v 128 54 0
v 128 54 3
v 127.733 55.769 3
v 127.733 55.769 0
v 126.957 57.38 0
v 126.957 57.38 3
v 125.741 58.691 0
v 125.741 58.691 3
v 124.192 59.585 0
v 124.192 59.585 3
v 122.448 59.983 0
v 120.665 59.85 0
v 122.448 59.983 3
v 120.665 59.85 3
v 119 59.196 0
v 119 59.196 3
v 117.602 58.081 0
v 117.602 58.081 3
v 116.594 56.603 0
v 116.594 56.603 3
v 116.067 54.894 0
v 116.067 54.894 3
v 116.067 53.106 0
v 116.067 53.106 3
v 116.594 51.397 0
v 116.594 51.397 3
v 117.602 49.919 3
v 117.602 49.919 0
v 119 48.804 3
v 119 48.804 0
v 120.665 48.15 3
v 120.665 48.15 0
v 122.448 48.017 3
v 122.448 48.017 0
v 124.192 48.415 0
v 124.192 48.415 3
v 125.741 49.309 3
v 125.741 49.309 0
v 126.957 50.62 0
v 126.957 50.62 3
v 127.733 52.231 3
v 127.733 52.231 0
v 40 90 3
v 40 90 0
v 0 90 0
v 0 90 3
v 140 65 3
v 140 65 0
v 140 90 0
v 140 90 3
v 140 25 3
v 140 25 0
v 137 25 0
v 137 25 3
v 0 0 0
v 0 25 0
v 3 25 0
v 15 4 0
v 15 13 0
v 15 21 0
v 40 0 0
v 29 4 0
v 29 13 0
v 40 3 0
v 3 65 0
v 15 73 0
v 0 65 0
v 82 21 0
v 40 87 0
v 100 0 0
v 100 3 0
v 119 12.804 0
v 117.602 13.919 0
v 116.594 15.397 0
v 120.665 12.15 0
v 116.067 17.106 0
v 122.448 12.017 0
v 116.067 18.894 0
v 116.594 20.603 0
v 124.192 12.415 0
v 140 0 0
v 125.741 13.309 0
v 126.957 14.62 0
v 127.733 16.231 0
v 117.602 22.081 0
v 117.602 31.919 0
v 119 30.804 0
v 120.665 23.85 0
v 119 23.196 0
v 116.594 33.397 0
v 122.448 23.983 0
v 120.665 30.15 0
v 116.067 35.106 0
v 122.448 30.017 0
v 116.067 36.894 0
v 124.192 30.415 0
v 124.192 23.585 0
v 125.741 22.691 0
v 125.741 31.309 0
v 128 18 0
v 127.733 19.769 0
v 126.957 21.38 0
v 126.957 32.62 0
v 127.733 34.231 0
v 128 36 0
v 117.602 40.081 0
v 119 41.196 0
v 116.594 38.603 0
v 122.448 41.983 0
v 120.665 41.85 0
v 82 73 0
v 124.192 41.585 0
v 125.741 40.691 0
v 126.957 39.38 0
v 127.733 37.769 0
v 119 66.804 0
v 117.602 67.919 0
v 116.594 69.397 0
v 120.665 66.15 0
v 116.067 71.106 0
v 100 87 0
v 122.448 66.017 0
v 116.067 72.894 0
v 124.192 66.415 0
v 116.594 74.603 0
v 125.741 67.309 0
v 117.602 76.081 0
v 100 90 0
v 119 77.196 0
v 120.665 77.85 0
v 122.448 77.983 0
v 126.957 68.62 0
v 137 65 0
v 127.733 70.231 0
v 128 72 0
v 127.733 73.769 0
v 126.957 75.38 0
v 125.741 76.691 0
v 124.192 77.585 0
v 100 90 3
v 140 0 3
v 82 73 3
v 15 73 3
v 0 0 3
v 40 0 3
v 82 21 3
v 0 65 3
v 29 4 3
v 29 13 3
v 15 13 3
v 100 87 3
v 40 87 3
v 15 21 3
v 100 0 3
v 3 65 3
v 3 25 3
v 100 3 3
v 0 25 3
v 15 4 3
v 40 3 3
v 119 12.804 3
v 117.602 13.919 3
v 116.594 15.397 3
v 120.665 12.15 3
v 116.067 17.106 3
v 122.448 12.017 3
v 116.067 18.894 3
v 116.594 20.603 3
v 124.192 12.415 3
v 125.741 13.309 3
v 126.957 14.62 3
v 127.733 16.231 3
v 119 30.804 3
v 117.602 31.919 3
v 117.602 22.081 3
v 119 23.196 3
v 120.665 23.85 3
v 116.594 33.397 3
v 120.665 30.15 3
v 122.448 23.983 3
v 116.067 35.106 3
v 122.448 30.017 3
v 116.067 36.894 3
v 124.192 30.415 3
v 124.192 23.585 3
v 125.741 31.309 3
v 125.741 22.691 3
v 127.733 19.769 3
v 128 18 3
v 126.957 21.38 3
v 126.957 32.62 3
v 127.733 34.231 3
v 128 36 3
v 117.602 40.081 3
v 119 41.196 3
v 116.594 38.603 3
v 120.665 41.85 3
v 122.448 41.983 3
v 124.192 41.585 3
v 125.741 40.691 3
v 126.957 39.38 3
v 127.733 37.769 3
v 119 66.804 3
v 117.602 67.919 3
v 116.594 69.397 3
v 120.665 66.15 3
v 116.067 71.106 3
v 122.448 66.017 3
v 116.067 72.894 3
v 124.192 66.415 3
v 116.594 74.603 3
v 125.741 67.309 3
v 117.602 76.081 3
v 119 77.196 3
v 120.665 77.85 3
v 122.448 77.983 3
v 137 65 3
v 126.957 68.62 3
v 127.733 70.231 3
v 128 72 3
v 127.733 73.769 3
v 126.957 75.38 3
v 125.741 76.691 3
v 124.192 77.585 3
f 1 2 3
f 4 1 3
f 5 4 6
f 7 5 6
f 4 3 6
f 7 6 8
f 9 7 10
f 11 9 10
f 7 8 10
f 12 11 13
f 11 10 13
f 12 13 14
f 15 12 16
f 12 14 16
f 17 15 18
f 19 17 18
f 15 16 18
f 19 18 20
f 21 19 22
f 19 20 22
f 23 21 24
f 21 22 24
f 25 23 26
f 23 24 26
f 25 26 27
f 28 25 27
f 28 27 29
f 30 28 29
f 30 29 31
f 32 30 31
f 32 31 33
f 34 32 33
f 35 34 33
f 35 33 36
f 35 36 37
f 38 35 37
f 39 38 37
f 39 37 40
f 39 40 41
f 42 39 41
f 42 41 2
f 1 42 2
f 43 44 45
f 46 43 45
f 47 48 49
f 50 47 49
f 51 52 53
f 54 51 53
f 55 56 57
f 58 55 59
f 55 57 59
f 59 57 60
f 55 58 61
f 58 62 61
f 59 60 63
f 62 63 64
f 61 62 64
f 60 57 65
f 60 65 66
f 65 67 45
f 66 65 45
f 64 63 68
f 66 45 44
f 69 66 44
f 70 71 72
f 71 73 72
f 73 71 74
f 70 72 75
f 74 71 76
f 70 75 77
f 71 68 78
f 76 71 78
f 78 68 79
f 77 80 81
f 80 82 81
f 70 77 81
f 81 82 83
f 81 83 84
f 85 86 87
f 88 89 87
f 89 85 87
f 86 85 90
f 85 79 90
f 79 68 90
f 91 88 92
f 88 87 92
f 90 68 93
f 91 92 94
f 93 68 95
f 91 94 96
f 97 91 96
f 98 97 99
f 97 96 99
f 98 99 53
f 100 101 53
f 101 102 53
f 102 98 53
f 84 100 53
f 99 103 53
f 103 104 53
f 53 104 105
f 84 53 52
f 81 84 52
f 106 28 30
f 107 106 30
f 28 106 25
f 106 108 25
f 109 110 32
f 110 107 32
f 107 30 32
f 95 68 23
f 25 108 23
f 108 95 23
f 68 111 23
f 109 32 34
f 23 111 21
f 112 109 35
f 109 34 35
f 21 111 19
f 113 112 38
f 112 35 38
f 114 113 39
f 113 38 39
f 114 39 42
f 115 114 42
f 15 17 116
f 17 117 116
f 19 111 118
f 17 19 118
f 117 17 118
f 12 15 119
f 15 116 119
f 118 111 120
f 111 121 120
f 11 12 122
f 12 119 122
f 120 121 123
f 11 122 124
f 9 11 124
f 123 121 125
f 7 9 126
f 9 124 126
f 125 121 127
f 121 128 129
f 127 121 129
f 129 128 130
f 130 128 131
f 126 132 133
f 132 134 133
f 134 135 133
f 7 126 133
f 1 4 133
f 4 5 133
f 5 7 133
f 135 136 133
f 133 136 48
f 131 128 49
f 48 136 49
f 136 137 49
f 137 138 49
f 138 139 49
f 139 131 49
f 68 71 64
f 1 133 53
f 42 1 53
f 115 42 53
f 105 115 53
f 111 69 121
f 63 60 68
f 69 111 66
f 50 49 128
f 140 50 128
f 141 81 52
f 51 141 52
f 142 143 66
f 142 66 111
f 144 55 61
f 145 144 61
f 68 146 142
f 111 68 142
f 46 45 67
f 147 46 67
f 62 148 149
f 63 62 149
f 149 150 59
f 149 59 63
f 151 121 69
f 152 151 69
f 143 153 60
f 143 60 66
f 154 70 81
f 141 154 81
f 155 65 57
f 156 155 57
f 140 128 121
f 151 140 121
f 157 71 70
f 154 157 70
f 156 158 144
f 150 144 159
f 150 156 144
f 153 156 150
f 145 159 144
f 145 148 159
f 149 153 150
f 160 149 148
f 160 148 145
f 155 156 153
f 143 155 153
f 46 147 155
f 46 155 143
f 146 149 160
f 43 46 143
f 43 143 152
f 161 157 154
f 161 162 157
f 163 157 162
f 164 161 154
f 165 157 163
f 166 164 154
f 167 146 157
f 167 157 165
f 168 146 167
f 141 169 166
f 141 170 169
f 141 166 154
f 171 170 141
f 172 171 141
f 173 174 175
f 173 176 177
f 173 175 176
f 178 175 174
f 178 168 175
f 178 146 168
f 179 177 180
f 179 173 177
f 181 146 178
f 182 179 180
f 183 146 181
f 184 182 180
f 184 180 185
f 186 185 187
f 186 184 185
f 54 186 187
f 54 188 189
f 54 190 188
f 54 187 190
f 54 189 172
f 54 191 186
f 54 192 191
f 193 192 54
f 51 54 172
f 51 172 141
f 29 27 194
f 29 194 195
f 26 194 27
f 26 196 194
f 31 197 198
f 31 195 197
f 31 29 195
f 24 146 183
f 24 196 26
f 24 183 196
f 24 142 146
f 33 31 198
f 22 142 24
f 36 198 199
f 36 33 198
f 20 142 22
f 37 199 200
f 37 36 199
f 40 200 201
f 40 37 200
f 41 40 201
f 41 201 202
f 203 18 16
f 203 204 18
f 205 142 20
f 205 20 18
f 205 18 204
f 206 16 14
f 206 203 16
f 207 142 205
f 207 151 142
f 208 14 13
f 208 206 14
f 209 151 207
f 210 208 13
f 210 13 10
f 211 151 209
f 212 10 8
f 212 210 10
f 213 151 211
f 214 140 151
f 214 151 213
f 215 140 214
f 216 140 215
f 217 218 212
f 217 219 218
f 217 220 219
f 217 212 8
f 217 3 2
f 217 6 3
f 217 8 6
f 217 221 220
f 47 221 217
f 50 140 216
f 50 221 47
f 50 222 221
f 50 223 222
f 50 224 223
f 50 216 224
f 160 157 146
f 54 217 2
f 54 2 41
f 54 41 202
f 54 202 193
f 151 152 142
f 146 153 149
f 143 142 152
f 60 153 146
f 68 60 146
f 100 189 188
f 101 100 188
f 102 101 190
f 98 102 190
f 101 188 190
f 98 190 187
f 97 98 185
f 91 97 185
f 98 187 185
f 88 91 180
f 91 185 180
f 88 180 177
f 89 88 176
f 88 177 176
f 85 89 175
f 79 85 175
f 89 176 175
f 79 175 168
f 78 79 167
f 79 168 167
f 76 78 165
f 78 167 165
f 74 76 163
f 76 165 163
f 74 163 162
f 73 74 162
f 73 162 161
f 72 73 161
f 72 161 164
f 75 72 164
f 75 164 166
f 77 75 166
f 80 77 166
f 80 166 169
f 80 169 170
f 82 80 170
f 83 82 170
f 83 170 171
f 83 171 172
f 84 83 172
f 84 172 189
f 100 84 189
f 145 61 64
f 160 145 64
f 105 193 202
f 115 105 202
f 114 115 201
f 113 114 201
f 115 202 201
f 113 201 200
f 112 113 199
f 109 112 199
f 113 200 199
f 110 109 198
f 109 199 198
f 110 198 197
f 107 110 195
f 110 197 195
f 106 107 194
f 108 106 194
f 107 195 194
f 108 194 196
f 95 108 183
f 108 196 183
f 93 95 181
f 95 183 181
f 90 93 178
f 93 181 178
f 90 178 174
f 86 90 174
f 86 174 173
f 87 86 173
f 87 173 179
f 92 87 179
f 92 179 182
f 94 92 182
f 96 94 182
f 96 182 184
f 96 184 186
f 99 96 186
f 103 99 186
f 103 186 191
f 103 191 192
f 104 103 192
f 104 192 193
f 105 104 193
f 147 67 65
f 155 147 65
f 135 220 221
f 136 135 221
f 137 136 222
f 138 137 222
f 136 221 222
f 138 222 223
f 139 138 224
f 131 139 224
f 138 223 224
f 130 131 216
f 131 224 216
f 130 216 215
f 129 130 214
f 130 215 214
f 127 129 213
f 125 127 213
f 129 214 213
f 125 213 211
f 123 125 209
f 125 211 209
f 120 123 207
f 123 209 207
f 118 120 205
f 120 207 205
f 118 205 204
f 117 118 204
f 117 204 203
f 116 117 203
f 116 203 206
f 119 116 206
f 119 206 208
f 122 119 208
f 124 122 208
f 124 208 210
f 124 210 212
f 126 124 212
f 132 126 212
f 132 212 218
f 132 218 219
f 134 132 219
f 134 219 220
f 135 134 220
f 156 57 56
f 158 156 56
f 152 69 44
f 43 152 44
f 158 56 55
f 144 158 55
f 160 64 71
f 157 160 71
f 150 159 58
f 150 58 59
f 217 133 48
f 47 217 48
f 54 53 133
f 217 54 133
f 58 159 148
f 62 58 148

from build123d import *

# Parameters (mm, degrees)
EXTRUDE_1_DEPTH     = 3
SKETCH_2_W          = 14
SKETCH_2_H          = 9
CUT_EXTRUDE_1_DEPTH = 167.460205455
SKETCH_3_W          = 67
SKETCH_3_H          = 52
CUT_EXTRUDE_2_DEPTH = 167.460205455
SKETCH_4_R          = 6
CUT_EXTRUDE_3_DEPTH = 167.460205455


with BuildPart() as part:
    # Эскиз1 → Бобышка-Вытянуть1 (new body)
    with BuildSketch(Plane.XY):
        Polygon((0, 0), (40, 0), (40, 3), (100, 3), (100, 0), (140, 0), (140, 25), (137, 25), (137, 65), (140, 65), (140, 90), (100, 90), (100, 87), (40, 87), (40, 90), (0, 90), (0, 65), (3, 65), (3, 25), (0, 25), align=None)
    extrude(amount=EXTRUDE_1_DEPTH)

    # Эскиз2 → Вырез-Вытянуть1 (cut, through all)
    with BuildSketch(Plane.XY.offset(3)):
        with Locations((22, 8.5)):
            Rectangle(SKETCH_2_W, SKETCH_2_H)
    extrude(amount=-CUT_EXTRUDE_1_DEPTH, mode=Mode.SUBTRACT)

    # Эскиз3 → Вырез-Вытянуть2 (cut, through all)
    with BuildSketch(Plane.XY.offset(3)):
        with Locations((48.5, 47)):
            Rectangle(SKETCH_3_W, SKETCH_3_H)
    extrude(amount=-CUT_EXTRUDE_2_DEPTH, mode=Mode.SUBTRACT)

    # Эскиз4 → Вырез-Вытянуть3 (cut, through all)
    with BuildSketch(Plane.XY.offset(3)):
        with Locations((122, 72)):
            Circle(SKETCH_4_R)
        with Locations((122, 54)):
            Circle(SKETCH_4_R)
        with Locations((122, 36)):
            Circle(SKETCH_4_R)
        with Locations((122, 18)):
            Circle(SKETCH_4_R)
    extrude(amount=-CUT_EXTRUDE_3_DEPTH, mode=Mode.SUBTRACT)


solid = part.part
